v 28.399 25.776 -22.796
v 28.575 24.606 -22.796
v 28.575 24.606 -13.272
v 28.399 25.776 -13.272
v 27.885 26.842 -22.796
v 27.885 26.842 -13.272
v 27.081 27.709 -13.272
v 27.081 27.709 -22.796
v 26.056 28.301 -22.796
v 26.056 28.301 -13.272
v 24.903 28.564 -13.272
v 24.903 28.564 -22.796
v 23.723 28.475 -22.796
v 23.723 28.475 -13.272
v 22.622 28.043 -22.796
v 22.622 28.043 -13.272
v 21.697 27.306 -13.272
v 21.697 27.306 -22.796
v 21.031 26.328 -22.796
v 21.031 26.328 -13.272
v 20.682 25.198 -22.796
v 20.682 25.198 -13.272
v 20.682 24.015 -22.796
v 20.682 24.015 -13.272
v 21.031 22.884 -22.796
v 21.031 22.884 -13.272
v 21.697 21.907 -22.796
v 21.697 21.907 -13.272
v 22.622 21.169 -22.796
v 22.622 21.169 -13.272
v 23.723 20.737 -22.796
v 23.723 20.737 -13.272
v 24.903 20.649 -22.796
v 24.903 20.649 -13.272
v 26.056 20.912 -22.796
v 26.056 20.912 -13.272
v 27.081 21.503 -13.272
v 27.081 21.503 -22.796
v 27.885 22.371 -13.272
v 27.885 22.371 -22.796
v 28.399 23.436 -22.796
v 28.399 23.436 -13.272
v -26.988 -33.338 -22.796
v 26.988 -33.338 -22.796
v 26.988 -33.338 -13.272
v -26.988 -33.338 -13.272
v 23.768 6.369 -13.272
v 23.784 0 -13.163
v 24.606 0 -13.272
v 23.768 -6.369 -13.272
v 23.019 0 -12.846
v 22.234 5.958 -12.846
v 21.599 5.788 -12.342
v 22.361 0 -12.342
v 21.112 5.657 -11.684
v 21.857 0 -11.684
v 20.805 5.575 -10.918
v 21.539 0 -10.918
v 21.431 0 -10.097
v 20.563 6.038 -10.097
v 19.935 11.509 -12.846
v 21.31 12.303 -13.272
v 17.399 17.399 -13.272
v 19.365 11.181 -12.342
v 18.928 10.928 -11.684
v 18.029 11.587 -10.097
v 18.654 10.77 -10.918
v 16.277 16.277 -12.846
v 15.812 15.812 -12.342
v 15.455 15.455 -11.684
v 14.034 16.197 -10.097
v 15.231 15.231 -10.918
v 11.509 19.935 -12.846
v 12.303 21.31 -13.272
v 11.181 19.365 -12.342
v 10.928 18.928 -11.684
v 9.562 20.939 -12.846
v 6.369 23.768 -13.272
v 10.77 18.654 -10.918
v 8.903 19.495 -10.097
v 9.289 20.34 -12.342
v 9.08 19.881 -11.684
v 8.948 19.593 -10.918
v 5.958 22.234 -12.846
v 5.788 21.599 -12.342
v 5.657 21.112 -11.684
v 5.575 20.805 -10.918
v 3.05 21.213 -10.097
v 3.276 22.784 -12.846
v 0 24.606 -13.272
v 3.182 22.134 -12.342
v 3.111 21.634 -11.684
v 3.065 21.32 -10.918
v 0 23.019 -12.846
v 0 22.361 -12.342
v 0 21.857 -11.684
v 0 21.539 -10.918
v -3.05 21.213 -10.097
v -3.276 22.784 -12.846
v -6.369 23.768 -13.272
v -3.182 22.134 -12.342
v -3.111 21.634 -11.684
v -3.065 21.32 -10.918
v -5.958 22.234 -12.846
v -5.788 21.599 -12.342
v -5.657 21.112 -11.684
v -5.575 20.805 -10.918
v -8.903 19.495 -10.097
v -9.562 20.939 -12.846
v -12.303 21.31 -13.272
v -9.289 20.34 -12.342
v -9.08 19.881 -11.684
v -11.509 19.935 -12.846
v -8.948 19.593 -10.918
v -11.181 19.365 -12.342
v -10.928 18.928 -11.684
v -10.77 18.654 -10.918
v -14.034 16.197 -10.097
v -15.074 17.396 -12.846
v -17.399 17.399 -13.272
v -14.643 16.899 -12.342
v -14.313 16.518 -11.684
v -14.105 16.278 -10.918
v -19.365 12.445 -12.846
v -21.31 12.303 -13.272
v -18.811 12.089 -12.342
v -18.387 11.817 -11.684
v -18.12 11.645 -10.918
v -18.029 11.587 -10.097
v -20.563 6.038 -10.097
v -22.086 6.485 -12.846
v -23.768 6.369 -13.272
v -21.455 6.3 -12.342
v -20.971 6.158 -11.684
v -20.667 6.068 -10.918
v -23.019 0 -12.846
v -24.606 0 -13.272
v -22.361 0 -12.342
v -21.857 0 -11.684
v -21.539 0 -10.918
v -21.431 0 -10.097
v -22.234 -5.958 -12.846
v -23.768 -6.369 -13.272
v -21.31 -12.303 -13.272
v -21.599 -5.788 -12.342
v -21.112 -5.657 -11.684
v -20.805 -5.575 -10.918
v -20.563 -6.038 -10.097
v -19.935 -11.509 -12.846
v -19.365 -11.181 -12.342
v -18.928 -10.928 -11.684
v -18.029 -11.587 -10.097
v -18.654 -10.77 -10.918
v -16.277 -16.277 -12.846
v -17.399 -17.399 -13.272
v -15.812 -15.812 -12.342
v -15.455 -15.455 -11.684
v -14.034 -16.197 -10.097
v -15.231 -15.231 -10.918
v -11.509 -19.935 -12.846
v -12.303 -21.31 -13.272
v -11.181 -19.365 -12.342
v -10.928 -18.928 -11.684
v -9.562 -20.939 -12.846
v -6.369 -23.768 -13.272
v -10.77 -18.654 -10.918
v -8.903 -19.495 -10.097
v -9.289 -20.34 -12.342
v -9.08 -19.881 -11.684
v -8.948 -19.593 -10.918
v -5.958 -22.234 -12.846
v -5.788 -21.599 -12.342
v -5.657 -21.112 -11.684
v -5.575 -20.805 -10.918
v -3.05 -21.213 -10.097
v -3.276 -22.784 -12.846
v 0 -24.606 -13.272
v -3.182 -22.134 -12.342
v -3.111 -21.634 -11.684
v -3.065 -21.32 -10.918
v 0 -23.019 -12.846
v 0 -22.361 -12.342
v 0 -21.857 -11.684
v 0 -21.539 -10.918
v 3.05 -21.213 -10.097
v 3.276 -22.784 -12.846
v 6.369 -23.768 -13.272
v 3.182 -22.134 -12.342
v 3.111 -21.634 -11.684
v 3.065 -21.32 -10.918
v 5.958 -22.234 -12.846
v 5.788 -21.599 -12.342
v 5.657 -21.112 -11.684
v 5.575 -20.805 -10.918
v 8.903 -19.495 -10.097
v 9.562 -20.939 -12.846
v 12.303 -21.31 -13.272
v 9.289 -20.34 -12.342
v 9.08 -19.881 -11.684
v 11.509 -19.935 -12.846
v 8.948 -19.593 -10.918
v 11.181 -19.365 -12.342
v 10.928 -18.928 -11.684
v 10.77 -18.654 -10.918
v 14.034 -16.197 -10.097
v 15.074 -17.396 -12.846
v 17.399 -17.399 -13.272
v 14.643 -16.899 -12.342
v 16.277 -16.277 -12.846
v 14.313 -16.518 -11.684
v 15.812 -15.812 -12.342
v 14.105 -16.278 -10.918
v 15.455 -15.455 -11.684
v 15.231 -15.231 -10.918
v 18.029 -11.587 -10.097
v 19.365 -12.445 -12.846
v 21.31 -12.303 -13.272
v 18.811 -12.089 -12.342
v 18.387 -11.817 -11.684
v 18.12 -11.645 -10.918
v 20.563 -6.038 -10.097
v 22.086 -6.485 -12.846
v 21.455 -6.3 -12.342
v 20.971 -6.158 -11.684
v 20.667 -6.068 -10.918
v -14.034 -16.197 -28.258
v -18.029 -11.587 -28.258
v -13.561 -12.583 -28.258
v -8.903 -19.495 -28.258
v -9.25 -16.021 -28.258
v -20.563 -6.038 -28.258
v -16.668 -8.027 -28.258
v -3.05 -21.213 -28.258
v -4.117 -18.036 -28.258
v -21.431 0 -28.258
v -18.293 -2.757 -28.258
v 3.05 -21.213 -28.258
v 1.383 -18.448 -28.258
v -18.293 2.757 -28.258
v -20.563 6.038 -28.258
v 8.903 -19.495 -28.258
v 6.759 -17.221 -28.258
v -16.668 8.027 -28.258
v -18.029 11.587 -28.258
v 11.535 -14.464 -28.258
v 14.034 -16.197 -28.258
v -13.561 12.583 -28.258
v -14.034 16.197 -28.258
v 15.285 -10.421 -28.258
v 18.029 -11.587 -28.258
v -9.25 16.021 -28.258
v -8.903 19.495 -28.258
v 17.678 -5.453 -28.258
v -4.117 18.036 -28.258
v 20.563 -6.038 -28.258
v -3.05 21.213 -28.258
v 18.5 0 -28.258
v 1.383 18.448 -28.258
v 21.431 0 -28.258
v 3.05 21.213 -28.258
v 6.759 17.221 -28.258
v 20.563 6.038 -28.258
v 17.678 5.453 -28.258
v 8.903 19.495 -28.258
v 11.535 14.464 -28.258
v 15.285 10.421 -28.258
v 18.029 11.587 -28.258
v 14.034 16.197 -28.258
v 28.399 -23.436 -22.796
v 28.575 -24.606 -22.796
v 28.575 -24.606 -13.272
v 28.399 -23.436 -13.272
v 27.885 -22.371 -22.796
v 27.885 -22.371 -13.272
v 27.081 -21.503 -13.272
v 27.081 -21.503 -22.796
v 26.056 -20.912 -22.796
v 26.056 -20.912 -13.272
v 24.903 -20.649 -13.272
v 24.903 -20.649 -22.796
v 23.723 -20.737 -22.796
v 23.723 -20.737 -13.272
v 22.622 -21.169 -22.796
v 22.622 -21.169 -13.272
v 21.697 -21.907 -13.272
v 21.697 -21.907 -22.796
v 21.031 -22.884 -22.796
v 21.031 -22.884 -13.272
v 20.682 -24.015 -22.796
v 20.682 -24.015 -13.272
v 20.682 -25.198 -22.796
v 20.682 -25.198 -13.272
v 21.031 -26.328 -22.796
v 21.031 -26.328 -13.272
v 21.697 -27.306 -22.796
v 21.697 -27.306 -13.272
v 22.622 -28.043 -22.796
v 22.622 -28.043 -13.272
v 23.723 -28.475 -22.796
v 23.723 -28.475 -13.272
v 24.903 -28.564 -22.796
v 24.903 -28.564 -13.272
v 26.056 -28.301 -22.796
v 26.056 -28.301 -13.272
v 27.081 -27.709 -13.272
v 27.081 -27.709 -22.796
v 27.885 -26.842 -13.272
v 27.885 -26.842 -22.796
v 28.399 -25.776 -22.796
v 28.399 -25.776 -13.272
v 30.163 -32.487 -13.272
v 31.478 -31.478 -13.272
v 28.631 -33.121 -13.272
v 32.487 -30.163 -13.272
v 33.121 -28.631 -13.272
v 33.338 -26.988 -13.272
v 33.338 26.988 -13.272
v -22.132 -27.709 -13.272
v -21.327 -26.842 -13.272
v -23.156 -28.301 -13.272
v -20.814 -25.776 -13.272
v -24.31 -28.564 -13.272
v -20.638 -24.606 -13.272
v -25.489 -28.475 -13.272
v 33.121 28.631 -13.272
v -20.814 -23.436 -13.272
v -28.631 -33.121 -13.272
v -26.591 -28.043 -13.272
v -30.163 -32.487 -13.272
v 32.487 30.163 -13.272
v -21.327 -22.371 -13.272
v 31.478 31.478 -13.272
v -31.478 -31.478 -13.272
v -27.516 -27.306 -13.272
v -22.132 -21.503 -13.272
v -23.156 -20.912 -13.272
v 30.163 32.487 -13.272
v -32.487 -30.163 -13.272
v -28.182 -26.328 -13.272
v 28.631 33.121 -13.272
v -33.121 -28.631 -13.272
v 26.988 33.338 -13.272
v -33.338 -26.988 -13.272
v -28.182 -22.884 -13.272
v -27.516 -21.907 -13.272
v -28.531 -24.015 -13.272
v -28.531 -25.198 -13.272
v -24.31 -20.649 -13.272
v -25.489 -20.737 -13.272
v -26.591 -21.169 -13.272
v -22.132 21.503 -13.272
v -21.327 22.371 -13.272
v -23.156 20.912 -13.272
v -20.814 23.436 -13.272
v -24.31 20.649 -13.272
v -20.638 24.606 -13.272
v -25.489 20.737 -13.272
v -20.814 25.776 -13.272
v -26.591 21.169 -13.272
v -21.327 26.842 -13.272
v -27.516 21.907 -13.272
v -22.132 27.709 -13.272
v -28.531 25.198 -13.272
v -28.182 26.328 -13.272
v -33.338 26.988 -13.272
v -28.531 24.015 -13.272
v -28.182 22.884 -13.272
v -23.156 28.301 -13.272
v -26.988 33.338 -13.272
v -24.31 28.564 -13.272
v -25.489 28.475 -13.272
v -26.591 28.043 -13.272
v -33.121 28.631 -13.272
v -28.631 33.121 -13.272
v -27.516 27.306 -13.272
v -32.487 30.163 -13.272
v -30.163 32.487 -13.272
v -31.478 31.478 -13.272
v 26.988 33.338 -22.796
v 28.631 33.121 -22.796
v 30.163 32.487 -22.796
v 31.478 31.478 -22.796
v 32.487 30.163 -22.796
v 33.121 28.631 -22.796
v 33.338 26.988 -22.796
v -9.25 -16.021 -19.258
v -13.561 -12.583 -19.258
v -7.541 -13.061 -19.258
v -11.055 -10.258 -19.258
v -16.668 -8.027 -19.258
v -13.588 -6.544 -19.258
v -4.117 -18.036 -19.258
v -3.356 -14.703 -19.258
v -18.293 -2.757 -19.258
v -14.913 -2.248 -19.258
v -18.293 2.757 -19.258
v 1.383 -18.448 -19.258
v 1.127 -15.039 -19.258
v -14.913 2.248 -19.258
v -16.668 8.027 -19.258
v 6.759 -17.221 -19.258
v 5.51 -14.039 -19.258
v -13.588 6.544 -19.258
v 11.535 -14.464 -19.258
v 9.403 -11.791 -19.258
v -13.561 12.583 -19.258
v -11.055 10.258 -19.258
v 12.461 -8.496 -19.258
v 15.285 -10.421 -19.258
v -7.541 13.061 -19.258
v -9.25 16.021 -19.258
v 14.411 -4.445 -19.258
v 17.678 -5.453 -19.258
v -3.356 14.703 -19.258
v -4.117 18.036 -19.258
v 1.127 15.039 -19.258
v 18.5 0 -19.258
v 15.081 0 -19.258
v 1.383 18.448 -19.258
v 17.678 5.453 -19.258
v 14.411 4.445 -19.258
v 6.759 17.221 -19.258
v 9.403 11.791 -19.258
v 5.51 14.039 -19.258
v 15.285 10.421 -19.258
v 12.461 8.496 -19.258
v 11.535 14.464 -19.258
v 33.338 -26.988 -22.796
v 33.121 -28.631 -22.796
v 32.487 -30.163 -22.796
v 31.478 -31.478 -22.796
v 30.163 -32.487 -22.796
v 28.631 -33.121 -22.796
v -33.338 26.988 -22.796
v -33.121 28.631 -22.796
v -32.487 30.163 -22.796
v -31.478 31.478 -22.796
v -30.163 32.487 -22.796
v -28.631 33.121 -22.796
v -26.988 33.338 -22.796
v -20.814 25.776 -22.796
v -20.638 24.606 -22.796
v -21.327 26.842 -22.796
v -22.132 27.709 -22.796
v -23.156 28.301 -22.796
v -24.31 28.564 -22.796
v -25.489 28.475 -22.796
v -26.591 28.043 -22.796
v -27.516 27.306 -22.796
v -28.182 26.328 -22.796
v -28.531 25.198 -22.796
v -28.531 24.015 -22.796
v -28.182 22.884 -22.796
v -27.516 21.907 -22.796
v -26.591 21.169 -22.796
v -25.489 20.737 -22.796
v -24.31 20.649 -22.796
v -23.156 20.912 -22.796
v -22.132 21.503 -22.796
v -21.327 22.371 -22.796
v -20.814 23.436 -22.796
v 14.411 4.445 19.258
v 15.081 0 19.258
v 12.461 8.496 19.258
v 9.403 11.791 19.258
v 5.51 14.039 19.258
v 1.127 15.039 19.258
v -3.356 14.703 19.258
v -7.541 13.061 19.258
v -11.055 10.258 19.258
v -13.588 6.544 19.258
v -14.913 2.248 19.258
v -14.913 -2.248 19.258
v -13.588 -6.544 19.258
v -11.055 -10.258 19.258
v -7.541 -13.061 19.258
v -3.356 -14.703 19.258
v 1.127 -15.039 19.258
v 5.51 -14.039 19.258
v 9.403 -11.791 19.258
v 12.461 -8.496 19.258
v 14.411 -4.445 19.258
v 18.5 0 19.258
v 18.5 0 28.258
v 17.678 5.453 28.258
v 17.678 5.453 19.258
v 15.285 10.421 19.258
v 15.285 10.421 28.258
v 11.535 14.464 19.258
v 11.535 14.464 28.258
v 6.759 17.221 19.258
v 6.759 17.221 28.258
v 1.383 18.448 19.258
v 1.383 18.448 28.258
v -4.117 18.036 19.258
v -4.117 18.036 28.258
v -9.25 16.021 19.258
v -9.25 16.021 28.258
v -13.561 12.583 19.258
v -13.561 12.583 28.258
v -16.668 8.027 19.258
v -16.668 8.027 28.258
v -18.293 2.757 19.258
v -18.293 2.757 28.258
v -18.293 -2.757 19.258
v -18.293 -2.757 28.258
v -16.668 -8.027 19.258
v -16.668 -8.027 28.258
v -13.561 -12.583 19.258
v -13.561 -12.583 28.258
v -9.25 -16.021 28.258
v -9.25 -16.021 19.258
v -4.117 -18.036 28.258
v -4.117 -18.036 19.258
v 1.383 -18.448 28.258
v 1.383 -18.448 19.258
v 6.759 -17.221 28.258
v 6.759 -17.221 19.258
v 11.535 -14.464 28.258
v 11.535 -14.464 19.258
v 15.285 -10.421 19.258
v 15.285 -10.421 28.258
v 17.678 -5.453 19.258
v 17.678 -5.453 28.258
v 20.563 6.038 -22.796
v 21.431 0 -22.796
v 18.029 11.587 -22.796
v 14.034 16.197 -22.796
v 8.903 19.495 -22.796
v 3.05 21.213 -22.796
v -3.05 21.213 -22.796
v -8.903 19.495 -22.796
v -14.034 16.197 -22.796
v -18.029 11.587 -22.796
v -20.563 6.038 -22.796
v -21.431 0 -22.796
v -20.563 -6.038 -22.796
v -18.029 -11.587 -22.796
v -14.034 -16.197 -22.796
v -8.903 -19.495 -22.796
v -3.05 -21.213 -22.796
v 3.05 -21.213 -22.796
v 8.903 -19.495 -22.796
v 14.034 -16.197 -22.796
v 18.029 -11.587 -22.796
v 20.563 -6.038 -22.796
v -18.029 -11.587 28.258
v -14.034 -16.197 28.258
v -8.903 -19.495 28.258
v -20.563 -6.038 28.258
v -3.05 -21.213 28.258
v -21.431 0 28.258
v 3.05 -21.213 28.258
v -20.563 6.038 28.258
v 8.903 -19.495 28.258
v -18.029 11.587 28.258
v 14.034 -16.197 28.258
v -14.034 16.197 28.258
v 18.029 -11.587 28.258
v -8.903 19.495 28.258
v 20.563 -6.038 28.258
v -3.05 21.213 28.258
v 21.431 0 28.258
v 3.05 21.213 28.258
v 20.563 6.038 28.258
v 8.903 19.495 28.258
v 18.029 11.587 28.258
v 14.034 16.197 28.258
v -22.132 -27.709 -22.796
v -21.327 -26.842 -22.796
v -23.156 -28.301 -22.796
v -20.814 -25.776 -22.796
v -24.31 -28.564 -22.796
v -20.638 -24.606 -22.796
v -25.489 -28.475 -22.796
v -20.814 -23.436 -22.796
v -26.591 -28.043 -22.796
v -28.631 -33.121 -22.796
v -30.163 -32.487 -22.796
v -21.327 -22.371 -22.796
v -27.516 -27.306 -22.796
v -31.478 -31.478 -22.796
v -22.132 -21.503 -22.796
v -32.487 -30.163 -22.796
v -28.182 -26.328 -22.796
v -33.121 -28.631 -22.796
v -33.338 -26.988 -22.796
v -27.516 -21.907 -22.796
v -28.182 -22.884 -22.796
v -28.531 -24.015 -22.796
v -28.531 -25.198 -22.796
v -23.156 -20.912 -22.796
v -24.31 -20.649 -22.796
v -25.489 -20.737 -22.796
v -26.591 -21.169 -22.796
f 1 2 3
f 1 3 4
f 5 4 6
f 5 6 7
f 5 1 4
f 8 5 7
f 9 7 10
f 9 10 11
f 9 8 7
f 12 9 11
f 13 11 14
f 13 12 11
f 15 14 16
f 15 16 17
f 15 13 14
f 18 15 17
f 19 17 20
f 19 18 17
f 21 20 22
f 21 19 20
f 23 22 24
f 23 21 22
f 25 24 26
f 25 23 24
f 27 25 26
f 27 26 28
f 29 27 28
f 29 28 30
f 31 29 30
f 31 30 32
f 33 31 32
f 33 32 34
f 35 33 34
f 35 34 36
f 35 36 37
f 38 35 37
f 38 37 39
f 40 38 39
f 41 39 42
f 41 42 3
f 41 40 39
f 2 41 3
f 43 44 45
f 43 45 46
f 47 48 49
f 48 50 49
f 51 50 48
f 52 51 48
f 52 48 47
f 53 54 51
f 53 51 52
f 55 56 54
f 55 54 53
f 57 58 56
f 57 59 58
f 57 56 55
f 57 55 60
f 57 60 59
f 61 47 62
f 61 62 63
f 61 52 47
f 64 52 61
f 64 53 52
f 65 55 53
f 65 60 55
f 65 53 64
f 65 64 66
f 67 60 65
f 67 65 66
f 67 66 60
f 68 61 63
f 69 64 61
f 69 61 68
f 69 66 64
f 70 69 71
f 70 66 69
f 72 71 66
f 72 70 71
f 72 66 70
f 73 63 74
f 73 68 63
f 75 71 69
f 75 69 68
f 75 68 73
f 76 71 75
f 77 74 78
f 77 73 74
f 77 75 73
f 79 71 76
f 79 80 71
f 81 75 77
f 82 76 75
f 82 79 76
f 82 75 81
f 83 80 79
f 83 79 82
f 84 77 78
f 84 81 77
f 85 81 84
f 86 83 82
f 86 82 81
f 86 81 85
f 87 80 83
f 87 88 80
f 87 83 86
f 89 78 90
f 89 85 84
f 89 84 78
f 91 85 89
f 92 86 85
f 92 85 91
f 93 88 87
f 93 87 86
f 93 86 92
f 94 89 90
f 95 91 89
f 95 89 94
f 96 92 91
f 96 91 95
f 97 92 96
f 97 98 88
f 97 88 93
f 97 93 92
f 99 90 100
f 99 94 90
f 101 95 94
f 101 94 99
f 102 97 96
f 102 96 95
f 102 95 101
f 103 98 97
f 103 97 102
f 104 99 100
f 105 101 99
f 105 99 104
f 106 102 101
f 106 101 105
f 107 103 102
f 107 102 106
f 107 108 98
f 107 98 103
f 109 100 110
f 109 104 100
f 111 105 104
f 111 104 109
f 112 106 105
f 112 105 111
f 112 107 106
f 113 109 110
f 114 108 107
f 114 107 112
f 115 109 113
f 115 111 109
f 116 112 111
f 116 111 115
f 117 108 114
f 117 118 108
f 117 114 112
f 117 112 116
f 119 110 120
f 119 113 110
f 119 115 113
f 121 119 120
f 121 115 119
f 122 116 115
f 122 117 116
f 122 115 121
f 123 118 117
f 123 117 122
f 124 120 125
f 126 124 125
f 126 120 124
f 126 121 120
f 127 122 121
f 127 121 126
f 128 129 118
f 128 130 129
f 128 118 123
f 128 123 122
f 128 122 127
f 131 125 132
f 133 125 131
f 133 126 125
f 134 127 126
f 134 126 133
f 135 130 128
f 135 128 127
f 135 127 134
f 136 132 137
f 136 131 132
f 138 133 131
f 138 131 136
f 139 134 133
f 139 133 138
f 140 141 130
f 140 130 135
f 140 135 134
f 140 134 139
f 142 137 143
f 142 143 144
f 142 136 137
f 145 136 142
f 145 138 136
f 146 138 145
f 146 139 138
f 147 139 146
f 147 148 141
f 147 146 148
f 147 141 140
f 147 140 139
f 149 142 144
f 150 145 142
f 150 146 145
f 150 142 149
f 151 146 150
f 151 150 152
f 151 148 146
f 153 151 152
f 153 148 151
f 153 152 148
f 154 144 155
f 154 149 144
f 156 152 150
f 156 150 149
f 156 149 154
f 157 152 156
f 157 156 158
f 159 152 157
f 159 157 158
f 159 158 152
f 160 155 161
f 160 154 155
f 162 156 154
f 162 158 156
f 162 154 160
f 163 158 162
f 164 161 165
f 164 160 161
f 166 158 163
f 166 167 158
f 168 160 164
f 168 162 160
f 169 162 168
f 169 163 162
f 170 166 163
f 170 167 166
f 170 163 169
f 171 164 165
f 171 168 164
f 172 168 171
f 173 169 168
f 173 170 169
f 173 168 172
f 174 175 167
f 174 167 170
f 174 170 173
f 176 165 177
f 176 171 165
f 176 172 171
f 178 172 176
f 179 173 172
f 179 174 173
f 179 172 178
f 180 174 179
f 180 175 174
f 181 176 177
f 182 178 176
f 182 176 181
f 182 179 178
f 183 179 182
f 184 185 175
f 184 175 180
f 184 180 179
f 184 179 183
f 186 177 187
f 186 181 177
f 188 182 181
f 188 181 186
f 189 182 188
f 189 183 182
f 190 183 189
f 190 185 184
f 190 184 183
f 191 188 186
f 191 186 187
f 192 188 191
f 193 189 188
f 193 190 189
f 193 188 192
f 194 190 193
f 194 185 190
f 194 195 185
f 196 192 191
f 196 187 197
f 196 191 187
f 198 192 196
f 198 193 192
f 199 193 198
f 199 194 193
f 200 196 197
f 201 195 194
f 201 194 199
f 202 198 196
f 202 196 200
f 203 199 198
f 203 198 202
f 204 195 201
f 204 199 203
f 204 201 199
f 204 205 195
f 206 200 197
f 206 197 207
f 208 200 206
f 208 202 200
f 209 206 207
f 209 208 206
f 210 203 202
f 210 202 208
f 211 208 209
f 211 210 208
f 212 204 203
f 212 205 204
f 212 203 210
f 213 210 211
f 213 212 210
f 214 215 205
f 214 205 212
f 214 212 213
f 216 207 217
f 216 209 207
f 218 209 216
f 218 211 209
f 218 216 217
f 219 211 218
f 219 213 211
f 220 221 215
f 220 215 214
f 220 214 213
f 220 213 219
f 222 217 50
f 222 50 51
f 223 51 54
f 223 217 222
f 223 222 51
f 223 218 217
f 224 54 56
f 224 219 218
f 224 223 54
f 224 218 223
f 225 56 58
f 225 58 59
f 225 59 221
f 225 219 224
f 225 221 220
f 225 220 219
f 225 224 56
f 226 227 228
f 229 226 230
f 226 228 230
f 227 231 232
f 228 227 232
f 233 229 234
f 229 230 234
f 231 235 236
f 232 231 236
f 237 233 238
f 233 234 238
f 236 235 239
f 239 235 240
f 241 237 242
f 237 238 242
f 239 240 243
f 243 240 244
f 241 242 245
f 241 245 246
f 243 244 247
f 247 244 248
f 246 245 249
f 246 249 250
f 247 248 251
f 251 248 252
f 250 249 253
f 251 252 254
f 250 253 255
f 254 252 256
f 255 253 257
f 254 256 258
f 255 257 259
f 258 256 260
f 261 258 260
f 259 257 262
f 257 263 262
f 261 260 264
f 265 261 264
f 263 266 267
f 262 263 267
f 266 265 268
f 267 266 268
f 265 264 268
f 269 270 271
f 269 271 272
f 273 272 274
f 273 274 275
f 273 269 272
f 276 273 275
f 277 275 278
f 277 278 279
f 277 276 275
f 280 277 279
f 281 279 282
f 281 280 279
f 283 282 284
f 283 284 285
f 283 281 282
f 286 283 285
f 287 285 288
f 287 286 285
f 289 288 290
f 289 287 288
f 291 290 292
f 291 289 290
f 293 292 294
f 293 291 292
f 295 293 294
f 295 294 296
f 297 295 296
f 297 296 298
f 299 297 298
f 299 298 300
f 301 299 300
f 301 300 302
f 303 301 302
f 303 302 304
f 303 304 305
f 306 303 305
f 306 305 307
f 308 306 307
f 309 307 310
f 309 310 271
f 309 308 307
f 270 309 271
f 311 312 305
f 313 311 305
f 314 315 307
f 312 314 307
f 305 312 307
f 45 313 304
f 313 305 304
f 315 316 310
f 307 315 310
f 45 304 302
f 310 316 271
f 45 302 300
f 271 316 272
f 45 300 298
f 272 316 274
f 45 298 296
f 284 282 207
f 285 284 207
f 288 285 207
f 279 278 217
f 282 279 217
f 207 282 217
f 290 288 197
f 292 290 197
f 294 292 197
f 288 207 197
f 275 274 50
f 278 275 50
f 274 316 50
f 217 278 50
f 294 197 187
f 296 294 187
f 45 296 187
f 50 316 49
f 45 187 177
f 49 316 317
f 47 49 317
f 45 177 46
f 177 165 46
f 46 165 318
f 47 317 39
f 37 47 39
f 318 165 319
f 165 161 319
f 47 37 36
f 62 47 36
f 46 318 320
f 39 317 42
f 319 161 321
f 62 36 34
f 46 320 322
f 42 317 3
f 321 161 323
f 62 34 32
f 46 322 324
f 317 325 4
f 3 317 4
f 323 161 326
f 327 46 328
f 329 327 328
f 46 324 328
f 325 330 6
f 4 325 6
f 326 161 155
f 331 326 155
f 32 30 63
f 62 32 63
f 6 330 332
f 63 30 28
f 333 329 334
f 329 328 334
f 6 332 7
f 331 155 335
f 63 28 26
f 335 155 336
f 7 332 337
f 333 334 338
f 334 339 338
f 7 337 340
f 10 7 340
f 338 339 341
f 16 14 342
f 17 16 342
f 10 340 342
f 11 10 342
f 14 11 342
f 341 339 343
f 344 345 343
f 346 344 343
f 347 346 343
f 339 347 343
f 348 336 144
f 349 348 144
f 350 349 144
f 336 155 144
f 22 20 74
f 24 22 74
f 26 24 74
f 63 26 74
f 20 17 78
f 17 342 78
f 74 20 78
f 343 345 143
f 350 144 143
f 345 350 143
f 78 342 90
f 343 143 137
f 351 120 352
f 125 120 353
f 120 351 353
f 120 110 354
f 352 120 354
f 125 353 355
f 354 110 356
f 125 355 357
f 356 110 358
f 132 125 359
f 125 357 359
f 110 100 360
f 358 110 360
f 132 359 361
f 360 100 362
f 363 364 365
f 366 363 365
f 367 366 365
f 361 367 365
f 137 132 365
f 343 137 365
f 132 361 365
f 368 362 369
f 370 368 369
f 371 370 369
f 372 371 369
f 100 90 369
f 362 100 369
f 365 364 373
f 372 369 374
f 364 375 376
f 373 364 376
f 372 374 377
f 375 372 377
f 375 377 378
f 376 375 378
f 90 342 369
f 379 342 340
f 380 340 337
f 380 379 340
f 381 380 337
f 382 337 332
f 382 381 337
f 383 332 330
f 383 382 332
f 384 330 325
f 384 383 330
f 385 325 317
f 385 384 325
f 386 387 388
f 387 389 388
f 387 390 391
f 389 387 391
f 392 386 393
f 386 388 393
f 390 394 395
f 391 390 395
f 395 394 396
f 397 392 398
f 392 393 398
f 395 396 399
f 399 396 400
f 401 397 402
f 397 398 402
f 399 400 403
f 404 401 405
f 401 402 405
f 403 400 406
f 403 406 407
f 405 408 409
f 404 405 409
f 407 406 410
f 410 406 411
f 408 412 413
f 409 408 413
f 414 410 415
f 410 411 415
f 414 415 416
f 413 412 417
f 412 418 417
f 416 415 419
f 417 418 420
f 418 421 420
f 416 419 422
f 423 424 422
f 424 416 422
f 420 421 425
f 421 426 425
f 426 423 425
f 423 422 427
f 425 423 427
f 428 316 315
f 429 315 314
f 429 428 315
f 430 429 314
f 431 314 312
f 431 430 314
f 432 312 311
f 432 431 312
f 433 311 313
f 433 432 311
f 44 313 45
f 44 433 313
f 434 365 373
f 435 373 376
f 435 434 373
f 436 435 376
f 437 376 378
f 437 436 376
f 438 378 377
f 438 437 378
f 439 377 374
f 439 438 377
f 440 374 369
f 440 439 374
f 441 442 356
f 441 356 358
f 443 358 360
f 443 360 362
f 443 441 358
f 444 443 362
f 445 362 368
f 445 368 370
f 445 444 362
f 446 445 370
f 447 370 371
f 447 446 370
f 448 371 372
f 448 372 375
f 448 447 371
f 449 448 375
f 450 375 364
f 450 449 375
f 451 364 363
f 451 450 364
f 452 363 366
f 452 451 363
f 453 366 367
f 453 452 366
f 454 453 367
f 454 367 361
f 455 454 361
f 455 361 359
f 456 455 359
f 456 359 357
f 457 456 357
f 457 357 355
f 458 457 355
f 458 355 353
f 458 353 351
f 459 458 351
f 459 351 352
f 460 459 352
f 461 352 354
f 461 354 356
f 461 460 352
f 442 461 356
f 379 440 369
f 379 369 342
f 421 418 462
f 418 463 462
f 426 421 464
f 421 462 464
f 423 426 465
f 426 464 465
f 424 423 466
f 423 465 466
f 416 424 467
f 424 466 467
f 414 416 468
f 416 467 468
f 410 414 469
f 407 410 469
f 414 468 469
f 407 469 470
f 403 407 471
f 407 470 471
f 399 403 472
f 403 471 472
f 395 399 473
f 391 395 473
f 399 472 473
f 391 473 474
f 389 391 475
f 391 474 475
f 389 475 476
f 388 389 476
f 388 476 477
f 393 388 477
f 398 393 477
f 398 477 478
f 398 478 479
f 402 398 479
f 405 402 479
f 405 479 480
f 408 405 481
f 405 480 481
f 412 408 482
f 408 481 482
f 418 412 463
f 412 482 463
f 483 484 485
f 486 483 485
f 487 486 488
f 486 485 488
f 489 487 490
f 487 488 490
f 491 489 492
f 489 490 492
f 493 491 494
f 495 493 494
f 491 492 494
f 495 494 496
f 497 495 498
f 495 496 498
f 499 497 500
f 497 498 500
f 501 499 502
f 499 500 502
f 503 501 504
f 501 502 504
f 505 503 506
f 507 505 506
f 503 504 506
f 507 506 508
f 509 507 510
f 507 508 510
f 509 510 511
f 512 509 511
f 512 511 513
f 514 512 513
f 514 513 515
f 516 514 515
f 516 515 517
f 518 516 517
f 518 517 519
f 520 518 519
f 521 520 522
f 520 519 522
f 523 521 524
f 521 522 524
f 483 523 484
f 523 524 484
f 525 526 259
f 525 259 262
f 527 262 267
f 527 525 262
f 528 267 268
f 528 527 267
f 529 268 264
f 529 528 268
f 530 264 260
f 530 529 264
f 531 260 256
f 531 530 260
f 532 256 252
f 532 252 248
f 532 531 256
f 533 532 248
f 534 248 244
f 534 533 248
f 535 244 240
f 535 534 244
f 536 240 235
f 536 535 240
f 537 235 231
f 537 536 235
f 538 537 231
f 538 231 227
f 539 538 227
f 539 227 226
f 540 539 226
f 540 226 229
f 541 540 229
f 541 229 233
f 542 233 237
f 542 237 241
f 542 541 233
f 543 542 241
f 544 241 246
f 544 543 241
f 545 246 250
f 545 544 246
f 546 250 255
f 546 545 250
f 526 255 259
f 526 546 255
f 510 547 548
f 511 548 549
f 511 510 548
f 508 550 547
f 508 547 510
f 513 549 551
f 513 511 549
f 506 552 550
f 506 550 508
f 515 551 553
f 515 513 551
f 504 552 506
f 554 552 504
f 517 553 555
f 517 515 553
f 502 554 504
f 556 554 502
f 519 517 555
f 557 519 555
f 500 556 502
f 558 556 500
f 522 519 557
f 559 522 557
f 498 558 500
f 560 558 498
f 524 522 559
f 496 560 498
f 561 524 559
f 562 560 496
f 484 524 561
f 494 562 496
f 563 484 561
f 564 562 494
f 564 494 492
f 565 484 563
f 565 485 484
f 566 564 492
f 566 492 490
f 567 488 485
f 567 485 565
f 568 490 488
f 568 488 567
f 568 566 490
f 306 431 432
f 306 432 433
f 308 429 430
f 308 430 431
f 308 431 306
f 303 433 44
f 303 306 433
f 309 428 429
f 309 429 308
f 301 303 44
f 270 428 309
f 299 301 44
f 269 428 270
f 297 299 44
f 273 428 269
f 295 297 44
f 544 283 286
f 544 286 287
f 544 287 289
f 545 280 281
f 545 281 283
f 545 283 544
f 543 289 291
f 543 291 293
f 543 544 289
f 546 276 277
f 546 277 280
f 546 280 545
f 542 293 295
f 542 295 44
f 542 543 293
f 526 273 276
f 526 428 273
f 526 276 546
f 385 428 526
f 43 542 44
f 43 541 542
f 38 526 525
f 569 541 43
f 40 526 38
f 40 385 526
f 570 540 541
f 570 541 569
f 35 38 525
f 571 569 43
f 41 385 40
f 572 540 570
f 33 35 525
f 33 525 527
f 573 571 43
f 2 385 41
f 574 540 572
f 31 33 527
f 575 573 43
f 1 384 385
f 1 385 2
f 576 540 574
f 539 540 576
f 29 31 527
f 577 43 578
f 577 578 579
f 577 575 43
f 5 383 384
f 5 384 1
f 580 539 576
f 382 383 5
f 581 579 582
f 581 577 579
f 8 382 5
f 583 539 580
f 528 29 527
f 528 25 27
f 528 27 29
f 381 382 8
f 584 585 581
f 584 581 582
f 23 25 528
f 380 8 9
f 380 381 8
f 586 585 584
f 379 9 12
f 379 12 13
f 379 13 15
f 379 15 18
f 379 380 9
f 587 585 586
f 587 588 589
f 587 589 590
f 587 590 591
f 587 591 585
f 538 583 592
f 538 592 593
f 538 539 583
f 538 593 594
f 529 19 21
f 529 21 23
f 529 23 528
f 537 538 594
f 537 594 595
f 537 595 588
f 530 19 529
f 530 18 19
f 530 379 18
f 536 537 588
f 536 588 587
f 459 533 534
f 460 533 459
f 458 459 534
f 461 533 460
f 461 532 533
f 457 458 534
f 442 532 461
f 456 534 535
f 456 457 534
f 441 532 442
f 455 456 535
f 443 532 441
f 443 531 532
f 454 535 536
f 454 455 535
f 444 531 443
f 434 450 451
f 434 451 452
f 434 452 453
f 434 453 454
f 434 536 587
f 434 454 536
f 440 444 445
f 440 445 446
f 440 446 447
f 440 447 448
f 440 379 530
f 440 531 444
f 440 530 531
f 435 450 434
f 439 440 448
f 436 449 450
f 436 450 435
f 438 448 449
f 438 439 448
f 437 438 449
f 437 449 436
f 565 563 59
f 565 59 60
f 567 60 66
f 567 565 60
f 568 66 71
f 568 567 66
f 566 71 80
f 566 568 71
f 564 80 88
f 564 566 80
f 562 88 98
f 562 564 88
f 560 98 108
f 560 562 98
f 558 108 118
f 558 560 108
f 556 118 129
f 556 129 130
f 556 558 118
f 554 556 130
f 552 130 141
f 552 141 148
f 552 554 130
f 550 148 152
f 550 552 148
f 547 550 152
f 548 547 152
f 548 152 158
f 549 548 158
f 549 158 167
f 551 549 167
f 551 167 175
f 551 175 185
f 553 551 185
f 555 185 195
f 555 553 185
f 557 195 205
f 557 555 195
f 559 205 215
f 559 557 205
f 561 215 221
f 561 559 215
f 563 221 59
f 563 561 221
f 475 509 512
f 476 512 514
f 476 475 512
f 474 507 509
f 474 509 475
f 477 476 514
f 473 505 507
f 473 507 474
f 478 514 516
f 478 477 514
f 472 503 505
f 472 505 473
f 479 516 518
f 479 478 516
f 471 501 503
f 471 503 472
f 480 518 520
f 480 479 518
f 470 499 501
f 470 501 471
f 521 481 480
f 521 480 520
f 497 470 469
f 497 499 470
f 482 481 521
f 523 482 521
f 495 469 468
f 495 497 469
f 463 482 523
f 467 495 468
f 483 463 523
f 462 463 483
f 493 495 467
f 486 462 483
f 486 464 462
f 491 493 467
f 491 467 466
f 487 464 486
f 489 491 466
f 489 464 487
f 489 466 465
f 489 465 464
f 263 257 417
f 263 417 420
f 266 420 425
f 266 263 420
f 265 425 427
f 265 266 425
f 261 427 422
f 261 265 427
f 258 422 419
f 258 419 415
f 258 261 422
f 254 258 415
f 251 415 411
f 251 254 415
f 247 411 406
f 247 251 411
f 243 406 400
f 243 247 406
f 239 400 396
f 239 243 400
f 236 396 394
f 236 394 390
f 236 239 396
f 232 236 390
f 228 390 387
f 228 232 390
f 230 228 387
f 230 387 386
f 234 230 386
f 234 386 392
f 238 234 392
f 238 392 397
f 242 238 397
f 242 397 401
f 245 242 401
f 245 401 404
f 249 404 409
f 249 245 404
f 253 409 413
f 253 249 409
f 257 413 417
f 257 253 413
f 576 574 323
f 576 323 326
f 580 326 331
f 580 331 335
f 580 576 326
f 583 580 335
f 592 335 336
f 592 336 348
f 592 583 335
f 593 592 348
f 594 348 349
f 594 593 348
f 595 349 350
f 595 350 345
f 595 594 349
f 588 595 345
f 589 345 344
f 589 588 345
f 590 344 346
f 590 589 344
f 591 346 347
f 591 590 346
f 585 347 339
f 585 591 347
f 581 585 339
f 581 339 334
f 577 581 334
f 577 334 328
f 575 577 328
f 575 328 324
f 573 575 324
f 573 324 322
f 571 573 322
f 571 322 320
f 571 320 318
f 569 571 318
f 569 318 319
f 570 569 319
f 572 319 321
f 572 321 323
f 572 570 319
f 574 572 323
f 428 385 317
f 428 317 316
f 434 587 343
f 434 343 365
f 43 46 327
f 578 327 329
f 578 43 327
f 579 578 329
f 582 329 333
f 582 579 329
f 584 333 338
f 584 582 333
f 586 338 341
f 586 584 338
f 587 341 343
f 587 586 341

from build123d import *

# Parameters (mm, degrees)
SKETCH1_R                = 21.43125
SKETCH1_R_2              = 15.08125
BOSS_EXTRUDE1_DEPTH      = 28.2575
BOSS_EXTRUDE1_DEPTH_BACK = 28.2575
SKETCH2_R                = 3.96875
SKETCH2_R_2              = 20.6375
BOSS_EXTRUDE2_DEPTH      = 9.525
SKETCH3_R                = 18.5
CUT_EXTRUDE1_DEPTH       = 9
FILLET1_R                = 3.175


with BuildPart() as part:
    # Sketch1 → Boss-Extrude1 (new body, two sides)
    with BuildSketch(Plane.XY) as boss_extrude1_sk:
        Circle(SKETCH1_R)
        Circle(SKETCH1_R_2, mode=Mode.SUBTRACT)
    extrude(amount=BOSS_EXTRUDE1_DEPTH)
    extrude(boss_extrude1_sk.sketch, amount=-BOSS_EXTRUDE1_DEPTH_BACK)

    # Sketch2 → Boss-Extrude2 (add)
    with BuildSketch(Plane.XY.offset(-22.7965)):
        with BuildLine():
            Line((-26.9875, 33.3375), (26.9875, 33.3375))
            ThreePointArc((26.9875, 33.3375), (31.477628061, 31.477628061), (33.3375, 26.9875))
            Line((33.3375, 26.9875), (33.3375, -26.9875))
            ThreePointArc((33.3375, -26.9875), (31.477628061, -31.477628061), (26.9875, -33.3375))
            Line((26.9875, -33.3375), (-26.9875, -33.3375))
            ThreePointArc((-26.9875, -33.3375), (-31.477628061, -31.477628061), (-33.3375, -26.9875))
            Line((-33.3375, -26.9875), (-33.3375, 26.9875))
            ThreePointArc((-33.3375, 26.9875), (-31.477628061, 31.477628061), (-26.9875, 33.3375))
        make_face()
        with Locations((-24.60625, 24.60625)):
            Circle(SKETCH2_R, mode=Mode.SUBTRACT)
        with Locations((24.60625, 24.60625)):
            Circle(SKETCH2_R, mode=Mode.SUBTRACT)
        with Locations((24.60625, -24.60625)):
            Circle(SKETCH2_R, mode=Mode.SUBTRACT)
        with Locations((-24.60625, -24.60625)):
            Circle(SKETCH2_R, mode=Mode.SUBTRACT)
        Circle(SKETCH2_R_2, mode=Mode.SUBTRACT)
    extrude(amount=BOSS_EXTRUDE2_DEPTH)

    # Sketch3 → Cut-Extrude1 (cut)
    with BuildSketch(Plane.XY.offset(28.2575)):
        Circle(SKETCH3_R)
    cut_extrude1 = extrude(amount=-CUT_EXTRUDE1_DEPTH, mode=Mode.SUBTRACT)

    # Mirror1: Cut-Extrude1 across plane
    add(cut_extrude1.mirror(Plane.XY), mode=Mode.SUBTRACT)

    # Fillet1
    fillet1_edges = [part.edges().sort_by_distance(p)[0] for p in [
        (-21.43125, 0, -13.2715),
    ]]
    fillet(fillet1_edges, radius=FILLET1_R)


solid = part.part
